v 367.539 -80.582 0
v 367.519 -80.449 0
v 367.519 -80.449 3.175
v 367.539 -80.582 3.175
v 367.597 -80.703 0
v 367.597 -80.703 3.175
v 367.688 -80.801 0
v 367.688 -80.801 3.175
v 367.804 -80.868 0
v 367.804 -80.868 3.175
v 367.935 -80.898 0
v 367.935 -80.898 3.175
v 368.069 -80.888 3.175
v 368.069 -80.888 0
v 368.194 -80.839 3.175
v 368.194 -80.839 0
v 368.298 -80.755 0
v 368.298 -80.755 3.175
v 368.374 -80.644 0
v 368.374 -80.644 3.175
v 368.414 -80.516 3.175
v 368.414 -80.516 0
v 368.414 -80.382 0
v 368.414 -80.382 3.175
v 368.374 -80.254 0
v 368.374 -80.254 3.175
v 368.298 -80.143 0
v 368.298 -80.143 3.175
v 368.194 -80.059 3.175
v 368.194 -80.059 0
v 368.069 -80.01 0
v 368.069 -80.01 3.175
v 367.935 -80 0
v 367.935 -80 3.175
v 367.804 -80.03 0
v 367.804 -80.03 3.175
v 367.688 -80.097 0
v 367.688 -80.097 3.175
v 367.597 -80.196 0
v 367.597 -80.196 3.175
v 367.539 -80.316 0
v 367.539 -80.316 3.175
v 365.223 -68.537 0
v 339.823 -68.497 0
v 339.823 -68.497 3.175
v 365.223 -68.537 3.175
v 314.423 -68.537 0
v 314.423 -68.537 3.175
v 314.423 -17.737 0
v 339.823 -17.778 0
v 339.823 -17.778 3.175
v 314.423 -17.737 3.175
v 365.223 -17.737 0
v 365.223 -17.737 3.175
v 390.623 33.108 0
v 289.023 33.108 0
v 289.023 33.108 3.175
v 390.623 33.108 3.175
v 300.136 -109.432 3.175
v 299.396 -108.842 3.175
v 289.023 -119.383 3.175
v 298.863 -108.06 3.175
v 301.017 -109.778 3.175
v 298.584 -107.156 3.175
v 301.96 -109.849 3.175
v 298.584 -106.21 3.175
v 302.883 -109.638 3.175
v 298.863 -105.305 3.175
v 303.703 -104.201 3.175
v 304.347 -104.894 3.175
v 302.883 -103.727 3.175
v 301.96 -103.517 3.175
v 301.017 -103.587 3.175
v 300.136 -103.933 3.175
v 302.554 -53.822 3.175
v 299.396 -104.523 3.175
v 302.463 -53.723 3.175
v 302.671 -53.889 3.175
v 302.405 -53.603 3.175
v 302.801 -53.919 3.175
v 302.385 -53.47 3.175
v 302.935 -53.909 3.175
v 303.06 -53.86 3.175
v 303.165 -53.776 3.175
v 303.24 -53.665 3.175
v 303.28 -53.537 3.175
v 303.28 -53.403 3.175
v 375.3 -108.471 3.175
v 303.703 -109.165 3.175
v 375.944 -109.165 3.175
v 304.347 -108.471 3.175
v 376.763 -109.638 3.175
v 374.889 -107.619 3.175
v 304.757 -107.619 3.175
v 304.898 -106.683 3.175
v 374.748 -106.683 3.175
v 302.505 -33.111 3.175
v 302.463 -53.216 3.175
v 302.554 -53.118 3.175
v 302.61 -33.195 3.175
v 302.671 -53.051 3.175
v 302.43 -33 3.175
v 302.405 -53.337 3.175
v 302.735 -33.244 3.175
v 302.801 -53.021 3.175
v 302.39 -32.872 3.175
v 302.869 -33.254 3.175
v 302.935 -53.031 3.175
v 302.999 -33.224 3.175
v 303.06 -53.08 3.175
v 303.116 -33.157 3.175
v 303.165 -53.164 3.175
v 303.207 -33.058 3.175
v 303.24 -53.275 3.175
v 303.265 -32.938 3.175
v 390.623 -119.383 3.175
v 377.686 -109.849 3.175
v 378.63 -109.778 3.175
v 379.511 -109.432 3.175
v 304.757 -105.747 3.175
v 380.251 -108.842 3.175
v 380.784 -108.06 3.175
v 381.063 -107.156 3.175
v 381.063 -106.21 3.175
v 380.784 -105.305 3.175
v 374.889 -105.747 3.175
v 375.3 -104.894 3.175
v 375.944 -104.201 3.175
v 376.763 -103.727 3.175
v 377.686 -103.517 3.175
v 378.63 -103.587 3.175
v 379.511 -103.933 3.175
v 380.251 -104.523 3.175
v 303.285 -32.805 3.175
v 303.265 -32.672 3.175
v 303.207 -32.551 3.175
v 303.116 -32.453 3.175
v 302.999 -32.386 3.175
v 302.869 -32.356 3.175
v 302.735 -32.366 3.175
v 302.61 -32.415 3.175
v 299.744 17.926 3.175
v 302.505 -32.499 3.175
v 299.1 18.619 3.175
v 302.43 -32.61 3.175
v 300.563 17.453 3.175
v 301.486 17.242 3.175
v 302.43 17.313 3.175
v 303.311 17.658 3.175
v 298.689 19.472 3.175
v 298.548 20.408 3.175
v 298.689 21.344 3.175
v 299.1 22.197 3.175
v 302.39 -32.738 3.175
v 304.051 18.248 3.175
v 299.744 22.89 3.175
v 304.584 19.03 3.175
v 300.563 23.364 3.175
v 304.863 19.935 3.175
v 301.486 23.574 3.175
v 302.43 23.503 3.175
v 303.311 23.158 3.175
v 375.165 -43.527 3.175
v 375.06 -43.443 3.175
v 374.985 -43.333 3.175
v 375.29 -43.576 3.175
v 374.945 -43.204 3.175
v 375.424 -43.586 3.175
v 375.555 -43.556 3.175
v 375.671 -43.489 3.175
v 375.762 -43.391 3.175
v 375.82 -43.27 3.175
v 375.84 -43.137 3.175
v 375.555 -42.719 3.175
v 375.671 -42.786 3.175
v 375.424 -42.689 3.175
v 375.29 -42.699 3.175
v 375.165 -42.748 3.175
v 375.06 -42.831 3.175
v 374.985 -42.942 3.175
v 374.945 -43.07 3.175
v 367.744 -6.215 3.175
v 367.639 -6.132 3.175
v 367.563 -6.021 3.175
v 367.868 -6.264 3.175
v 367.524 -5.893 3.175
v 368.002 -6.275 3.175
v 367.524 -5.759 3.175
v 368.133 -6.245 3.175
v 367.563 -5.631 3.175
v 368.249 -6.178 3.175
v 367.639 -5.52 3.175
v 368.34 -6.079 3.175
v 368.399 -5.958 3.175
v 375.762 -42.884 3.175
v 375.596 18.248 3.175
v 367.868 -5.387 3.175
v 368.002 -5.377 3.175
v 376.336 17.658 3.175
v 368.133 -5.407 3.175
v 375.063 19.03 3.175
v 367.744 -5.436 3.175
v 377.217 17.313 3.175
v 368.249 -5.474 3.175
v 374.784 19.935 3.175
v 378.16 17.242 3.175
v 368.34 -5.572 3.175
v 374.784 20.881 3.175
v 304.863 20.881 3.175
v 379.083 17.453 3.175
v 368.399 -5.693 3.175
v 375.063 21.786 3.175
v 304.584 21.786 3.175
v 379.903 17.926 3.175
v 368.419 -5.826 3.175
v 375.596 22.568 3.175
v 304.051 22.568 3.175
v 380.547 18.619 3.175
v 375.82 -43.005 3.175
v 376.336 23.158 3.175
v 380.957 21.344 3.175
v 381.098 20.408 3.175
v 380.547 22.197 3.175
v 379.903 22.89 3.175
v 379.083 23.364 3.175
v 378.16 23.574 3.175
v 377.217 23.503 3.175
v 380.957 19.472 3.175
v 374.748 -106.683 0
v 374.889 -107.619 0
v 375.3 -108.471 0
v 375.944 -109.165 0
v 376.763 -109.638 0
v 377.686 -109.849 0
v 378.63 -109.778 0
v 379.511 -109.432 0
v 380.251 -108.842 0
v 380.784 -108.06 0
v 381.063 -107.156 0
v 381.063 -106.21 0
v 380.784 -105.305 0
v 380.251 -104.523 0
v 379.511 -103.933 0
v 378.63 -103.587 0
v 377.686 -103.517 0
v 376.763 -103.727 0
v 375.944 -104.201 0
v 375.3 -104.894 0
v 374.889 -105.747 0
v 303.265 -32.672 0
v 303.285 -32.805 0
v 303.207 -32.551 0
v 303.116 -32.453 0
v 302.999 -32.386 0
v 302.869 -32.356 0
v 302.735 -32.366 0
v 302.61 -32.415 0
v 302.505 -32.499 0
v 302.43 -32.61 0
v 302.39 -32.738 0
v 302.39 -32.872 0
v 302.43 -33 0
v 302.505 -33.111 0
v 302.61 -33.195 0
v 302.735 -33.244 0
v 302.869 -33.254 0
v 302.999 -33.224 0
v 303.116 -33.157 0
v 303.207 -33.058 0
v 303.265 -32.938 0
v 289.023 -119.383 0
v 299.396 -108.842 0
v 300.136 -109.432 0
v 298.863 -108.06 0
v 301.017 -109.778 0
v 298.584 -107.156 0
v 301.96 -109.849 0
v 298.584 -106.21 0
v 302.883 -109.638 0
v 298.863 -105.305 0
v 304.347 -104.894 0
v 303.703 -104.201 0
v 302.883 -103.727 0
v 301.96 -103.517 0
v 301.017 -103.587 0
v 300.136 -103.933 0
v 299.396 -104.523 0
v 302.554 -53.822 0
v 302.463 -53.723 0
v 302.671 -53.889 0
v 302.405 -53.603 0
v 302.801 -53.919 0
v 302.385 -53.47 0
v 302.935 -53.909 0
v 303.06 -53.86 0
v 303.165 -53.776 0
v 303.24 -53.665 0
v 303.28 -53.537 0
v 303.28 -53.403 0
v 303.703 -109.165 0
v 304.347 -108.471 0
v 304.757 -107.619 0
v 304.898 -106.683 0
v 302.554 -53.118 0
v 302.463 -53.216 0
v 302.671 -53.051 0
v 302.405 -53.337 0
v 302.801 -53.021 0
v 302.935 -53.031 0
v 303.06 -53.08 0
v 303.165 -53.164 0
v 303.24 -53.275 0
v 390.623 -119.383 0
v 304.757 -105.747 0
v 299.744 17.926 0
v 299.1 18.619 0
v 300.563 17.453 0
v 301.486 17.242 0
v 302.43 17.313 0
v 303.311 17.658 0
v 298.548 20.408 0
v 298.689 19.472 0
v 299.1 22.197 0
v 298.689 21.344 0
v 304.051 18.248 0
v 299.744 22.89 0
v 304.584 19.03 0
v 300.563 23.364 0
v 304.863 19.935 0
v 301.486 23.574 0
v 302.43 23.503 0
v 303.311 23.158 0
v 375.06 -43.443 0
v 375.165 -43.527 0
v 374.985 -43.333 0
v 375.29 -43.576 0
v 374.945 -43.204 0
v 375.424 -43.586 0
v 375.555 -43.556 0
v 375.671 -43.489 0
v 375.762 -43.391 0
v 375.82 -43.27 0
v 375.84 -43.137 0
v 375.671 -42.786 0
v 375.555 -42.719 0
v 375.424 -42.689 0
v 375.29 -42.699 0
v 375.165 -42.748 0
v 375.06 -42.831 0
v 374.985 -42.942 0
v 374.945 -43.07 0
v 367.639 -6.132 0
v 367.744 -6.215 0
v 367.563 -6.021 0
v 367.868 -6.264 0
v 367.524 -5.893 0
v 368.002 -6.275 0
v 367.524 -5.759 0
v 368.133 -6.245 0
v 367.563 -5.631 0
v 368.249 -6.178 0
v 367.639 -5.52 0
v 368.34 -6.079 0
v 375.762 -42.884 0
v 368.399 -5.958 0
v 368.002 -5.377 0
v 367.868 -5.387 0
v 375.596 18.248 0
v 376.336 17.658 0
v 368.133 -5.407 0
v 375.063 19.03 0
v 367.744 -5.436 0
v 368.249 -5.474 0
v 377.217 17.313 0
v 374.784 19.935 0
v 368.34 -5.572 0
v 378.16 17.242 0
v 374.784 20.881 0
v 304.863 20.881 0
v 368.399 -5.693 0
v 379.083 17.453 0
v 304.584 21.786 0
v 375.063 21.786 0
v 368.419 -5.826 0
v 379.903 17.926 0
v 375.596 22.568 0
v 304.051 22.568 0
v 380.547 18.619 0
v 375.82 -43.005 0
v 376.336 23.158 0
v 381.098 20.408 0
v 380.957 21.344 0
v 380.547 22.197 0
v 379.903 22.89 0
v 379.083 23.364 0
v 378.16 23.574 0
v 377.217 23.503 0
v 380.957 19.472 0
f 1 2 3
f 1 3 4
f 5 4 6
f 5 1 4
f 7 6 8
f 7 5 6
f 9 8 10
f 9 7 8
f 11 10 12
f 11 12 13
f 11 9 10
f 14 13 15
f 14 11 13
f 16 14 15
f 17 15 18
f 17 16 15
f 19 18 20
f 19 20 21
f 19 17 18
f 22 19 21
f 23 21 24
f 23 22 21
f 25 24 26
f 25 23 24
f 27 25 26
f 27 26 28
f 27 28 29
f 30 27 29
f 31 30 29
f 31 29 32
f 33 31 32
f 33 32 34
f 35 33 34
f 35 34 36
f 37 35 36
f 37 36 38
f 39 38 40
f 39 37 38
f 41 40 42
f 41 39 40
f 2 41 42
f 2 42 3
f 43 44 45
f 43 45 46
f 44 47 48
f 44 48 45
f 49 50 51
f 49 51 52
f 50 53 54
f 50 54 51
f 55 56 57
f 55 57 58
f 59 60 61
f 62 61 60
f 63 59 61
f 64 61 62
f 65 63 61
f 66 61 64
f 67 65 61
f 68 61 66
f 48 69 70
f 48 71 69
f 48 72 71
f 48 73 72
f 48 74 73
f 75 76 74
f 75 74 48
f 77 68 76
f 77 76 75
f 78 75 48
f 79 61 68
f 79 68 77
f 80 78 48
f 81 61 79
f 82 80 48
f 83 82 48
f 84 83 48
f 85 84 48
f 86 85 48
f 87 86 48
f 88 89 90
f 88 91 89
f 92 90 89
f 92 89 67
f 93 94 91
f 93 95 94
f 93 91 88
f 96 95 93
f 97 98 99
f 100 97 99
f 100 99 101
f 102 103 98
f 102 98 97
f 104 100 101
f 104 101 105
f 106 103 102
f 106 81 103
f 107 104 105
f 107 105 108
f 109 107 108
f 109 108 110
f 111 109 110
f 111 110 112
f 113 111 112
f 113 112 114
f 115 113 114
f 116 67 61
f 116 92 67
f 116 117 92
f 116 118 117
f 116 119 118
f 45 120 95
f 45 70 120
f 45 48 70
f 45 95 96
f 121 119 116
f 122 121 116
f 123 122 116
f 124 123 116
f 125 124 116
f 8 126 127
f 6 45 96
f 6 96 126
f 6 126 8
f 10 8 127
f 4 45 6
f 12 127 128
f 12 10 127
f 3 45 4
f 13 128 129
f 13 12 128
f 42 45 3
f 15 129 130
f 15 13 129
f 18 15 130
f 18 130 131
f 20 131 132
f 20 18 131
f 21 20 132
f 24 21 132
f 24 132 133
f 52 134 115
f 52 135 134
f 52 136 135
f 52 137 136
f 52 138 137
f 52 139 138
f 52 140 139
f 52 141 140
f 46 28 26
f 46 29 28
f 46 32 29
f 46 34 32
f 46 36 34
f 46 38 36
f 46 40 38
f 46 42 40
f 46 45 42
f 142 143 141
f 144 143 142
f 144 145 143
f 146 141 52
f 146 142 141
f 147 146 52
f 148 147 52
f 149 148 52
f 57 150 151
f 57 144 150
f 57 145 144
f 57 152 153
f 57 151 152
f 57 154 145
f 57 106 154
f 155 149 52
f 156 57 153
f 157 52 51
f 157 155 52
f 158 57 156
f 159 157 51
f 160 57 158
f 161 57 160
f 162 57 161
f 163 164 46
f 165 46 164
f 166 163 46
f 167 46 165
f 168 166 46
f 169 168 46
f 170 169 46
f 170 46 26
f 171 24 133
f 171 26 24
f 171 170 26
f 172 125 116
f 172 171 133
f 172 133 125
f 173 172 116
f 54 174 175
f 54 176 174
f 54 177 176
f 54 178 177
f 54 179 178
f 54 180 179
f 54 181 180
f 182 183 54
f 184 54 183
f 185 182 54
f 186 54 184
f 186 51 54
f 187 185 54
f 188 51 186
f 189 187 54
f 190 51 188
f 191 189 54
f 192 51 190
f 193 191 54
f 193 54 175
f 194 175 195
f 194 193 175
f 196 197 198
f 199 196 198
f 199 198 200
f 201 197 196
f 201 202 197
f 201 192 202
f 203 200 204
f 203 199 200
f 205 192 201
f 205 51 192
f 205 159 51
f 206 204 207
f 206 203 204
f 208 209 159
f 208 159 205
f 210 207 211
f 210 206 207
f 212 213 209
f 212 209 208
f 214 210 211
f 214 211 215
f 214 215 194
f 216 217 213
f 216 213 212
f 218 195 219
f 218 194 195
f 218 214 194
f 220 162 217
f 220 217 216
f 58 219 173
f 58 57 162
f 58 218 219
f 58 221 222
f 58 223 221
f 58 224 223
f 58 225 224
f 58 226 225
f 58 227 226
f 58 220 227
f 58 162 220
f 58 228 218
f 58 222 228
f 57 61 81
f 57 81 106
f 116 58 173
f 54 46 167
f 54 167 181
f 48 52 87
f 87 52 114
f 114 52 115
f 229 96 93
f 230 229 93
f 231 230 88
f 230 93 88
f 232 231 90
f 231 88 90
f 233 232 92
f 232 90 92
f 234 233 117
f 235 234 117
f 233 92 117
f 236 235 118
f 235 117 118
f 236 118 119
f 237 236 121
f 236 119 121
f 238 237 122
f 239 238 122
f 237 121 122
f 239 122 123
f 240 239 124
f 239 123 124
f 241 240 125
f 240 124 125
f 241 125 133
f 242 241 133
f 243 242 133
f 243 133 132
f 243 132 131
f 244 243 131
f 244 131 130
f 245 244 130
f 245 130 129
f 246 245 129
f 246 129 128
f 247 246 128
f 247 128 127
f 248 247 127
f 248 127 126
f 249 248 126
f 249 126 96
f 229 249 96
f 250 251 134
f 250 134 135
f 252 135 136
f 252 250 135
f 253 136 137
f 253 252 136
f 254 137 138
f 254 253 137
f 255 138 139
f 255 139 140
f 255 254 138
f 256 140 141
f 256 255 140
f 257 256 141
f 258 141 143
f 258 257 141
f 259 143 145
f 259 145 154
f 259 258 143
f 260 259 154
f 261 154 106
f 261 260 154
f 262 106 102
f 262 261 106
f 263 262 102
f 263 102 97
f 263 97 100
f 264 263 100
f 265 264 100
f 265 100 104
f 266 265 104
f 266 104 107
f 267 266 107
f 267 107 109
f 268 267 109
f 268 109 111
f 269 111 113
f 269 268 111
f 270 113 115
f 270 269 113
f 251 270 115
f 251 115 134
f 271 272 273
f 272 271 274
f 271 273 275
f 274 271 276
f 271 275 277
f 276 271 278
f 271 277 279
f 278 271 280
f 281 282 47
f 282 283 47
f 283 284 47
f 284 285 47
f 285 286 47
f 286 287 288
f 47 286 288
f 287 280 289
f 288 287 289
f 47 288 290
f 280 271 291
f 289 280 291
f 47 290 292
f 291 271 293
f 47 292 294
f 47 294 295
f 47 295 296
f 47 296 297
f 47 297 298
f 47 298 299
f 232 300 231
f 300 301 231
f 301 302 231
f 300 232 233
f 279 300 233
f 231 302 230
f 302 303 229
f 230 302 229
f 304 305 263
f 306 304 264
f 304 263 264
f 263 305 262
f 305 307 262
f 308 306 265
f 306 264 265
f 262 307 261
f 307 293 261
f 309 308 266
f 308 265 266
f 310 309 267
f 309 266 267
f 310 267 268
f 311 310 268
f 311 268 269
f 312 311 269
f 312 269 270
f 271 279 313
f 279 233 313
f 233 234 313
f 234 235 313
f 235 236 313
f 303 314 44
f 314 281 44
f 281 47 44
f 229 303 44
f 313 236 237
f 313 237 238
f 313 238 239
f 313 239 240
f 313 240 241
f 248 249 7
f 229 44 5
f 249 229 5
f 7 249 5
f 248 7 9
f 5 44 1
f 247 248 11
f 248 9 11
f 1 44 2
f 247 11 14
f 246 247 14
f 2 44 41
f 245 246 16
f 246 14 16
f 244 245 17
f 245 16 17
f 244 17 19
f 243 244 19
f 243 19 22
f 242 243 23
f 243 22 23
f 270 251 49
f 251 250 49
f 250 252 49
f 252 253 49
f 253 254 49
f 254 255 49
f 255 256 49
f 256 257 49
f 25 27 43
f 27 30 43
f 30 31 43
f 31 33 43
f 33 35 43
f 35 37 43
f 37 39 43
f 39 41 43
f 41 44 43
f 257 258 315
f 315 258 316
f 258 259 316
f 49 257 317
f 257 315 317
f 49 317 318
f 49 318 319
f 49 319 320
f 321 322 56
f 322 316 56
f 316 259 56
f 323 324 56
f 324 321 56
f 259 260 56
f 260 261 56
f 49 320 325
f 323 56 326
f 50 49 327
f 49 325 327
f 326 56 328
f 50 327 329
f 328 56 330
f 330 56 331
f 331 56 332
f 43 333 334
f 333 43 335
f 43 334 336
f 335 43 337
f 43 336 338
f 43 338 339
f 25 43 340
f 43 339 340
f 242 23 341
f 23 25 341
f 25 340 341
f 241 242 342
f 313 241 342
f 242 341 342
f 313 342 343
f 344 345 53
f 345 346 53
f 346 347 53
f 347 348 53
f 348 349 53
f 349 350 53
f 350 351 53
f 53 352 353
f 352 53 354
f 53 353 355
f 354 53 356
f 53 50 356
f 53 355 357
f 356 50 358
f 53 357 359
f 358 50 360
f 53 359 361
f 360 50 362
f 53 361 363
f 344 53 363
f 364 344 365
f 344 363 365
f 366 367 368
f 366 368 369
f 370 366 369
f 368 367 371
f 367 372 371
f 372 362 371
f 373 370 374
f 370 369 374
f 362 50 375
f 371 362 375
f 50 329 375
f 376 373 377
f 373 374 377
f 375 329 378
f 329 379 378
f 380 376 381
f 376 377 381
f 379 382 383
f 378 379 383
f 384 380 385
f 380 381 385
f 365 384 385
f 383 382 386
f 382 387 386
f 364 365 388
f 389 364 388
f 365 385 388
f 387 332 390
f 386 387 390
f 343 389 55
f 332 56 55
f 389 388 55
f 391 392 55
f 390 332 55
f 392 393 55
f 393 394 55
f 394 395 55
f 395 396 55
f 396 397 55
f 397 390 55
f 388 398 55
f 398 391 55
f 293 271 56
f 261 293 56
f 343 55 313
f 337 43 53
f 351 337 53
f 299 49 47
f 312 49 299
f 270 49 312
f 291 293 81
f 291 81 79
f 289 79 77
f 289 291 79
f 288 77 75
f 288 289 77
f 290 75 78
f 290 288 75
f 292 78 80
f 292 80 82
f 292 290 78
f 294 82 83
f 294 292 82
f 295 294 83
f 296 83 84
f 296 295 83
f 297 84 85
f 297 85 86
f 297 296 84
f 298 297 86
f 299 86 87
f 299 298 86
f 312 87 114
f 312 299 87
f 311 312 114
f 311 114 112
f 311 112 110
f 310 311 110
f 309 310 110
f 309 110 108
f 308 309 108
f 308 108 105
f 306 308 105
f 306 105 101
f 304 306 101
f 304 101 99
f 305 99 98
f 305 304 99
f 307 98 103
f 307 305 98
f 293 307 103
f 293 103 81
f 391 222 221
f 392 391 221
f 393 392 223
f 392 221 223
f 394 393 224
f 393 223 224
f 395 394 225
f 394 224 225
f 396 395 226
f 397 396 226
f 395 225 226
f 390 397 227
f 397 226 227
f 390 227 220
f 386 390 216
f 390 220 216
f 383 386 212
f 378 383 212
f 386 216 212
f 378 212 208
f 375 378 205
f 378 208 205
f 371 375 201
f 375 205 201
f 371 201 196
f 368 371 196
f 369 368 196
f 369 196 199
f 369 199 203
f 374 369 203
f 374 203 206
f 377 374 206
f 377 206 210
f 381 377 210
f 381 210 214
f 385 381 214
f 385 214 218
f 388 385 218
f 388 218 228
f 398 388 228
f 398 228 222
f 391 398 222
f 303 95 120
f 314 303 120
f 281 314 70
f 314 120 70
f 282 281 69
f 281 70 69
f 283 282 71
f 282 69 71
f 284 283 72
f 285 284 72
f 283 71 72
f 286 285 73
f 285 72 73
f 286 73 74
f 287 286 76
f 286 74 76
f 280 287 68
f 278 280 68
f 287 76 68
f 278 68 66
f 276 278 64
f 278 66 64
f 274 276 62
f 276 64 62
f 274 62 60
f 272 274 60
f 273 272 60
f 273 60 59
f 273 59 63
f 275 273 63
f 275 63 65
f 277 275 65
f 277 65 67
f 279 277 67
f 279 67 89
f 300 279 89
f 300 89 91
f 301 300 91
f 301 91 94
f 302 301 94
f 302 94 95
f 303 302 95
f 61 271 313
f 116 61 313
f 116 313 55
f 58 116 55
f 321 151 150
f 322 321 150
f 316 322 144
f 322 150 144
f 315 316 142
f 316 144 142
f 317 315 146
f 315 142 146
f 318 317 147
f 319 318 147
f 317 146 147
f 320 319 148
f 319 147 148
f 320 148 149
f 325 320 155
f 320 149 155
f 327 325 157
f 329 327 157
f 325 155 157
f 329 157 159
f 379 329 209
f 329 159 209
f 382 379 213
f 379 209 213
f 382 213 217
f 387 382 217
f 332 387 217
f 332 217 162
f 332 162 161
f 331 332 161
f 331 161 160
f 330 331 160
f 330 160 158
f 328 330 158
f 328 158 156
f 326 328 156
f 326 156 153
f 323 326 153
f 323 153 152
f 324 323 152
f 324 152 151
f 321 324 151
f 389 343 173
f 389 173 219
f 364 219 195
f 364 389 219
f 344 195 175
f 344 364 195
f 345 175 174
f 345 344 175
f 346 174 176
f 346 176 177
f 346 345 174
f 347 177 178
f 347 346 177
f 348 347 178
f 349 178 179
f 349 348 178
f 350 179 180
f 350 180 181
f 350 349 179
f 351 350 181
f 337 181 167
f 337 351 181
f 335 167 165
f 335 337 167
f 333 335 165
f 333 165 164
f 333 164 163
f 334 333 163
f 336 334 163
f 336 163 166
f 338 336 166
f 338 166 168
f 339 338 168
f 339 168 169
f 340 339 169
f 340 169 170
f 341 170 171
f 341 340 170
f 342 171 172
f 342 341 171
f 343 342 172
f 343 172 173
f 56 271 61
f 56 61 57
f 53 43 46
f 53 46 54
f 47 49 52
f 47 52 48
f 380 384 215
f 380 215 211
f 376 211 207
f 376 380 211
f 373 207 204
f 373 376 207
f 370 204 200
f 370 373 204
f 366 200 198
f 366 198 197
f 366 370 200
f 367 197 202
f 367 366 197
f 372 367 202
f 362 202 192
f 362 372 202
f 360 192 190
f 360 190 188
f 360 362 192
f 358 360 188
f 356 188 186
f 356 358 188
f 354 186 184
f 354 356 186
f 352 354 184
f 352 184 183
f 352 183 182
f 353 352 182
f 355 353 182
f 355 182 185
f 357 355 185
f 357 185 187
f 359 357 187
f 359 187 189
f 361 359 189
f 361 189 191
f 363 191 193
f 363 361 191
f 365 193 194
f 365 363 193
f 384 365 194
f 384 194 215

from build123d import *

# Parameters (mm, degrees)
SKETCH2_W           = 101.6
SKETCH2_H           = 152.490905348
SKETCH2_R           = 0.45
BOSS_EXTRUDE1_DEPTH = 3.175
SKETCH3_R           = 3.175
CUT_EXTRUDE1_DEPTH  = 10


with BuildPart() as part:
    # Sketch2 → Boss-Extrude1 (new body)
    with BuildSketch(Plane.XY):
        with Locations((339.823220758, -43.137414152)):
            Rectangle(SKETCH2_W, SKETCH2_H)
        with Locations((302.835020758, -32.804961478)):
            Circle(SKETCH2_R, mode=Mode.SUBTRACT)
        with Locations((367.9685278, -5.825779496)):
            Circle(SKETCH2_R, mode=Mode.SUBTRACT)
        with Locations(Location((302.835020758, -53.469866826, 0), (0, 0, 180))):
            Circle(SKETCH2_R, mode=Mode.SUBTRACT)
        with Locations((375.390273381, -43.137414152)):
            Circle(SKETCH2_R, mode=Mode.SUBTRACT)
        with Locations(Location((367.9685278, -80.449048807, 0), (0, 0, 180))):
            Circle(SKETCH2_R, mode=Mode.SUBTRACT)
        Polygon((365.223220758, -17.737414152), (339.823220758, -17.778276649), (314.423220758, -17.737414152), (314.423220758, -68.537414152), (339.823220758, -68.496551654), (365.223220758, -68.537414152), align=None, mode=Mode.SUBTRACT)
    extrude(amount=BOSS_EXTRUDE1_DEPTH)

    # Sketch3 → Cut-Extrude1 (cut)
    with BuildSketch(Plane.XY.offset(3.175)):
        with Locations((377.923220758, 20.408038522)):
            Circle(SKETCH3_R)
        with Locations(Location((301.723220758, 20.408038522, 0), (0, 0, 180))):
            Circle(SKETCH3_R)
        with Locations((301.723220758, -106.682866826)):
            Circle(SKETCH3_R)
        with Locations(Location((377.923220758, -106.682866826, 0), (0, 0, 180))):
            Circle(SKETCH3_R)
    extrude(amount=-CUT_EXTRUDE1_DEPTH, mode=Mode.SUBTRACT)


solid = part.part
